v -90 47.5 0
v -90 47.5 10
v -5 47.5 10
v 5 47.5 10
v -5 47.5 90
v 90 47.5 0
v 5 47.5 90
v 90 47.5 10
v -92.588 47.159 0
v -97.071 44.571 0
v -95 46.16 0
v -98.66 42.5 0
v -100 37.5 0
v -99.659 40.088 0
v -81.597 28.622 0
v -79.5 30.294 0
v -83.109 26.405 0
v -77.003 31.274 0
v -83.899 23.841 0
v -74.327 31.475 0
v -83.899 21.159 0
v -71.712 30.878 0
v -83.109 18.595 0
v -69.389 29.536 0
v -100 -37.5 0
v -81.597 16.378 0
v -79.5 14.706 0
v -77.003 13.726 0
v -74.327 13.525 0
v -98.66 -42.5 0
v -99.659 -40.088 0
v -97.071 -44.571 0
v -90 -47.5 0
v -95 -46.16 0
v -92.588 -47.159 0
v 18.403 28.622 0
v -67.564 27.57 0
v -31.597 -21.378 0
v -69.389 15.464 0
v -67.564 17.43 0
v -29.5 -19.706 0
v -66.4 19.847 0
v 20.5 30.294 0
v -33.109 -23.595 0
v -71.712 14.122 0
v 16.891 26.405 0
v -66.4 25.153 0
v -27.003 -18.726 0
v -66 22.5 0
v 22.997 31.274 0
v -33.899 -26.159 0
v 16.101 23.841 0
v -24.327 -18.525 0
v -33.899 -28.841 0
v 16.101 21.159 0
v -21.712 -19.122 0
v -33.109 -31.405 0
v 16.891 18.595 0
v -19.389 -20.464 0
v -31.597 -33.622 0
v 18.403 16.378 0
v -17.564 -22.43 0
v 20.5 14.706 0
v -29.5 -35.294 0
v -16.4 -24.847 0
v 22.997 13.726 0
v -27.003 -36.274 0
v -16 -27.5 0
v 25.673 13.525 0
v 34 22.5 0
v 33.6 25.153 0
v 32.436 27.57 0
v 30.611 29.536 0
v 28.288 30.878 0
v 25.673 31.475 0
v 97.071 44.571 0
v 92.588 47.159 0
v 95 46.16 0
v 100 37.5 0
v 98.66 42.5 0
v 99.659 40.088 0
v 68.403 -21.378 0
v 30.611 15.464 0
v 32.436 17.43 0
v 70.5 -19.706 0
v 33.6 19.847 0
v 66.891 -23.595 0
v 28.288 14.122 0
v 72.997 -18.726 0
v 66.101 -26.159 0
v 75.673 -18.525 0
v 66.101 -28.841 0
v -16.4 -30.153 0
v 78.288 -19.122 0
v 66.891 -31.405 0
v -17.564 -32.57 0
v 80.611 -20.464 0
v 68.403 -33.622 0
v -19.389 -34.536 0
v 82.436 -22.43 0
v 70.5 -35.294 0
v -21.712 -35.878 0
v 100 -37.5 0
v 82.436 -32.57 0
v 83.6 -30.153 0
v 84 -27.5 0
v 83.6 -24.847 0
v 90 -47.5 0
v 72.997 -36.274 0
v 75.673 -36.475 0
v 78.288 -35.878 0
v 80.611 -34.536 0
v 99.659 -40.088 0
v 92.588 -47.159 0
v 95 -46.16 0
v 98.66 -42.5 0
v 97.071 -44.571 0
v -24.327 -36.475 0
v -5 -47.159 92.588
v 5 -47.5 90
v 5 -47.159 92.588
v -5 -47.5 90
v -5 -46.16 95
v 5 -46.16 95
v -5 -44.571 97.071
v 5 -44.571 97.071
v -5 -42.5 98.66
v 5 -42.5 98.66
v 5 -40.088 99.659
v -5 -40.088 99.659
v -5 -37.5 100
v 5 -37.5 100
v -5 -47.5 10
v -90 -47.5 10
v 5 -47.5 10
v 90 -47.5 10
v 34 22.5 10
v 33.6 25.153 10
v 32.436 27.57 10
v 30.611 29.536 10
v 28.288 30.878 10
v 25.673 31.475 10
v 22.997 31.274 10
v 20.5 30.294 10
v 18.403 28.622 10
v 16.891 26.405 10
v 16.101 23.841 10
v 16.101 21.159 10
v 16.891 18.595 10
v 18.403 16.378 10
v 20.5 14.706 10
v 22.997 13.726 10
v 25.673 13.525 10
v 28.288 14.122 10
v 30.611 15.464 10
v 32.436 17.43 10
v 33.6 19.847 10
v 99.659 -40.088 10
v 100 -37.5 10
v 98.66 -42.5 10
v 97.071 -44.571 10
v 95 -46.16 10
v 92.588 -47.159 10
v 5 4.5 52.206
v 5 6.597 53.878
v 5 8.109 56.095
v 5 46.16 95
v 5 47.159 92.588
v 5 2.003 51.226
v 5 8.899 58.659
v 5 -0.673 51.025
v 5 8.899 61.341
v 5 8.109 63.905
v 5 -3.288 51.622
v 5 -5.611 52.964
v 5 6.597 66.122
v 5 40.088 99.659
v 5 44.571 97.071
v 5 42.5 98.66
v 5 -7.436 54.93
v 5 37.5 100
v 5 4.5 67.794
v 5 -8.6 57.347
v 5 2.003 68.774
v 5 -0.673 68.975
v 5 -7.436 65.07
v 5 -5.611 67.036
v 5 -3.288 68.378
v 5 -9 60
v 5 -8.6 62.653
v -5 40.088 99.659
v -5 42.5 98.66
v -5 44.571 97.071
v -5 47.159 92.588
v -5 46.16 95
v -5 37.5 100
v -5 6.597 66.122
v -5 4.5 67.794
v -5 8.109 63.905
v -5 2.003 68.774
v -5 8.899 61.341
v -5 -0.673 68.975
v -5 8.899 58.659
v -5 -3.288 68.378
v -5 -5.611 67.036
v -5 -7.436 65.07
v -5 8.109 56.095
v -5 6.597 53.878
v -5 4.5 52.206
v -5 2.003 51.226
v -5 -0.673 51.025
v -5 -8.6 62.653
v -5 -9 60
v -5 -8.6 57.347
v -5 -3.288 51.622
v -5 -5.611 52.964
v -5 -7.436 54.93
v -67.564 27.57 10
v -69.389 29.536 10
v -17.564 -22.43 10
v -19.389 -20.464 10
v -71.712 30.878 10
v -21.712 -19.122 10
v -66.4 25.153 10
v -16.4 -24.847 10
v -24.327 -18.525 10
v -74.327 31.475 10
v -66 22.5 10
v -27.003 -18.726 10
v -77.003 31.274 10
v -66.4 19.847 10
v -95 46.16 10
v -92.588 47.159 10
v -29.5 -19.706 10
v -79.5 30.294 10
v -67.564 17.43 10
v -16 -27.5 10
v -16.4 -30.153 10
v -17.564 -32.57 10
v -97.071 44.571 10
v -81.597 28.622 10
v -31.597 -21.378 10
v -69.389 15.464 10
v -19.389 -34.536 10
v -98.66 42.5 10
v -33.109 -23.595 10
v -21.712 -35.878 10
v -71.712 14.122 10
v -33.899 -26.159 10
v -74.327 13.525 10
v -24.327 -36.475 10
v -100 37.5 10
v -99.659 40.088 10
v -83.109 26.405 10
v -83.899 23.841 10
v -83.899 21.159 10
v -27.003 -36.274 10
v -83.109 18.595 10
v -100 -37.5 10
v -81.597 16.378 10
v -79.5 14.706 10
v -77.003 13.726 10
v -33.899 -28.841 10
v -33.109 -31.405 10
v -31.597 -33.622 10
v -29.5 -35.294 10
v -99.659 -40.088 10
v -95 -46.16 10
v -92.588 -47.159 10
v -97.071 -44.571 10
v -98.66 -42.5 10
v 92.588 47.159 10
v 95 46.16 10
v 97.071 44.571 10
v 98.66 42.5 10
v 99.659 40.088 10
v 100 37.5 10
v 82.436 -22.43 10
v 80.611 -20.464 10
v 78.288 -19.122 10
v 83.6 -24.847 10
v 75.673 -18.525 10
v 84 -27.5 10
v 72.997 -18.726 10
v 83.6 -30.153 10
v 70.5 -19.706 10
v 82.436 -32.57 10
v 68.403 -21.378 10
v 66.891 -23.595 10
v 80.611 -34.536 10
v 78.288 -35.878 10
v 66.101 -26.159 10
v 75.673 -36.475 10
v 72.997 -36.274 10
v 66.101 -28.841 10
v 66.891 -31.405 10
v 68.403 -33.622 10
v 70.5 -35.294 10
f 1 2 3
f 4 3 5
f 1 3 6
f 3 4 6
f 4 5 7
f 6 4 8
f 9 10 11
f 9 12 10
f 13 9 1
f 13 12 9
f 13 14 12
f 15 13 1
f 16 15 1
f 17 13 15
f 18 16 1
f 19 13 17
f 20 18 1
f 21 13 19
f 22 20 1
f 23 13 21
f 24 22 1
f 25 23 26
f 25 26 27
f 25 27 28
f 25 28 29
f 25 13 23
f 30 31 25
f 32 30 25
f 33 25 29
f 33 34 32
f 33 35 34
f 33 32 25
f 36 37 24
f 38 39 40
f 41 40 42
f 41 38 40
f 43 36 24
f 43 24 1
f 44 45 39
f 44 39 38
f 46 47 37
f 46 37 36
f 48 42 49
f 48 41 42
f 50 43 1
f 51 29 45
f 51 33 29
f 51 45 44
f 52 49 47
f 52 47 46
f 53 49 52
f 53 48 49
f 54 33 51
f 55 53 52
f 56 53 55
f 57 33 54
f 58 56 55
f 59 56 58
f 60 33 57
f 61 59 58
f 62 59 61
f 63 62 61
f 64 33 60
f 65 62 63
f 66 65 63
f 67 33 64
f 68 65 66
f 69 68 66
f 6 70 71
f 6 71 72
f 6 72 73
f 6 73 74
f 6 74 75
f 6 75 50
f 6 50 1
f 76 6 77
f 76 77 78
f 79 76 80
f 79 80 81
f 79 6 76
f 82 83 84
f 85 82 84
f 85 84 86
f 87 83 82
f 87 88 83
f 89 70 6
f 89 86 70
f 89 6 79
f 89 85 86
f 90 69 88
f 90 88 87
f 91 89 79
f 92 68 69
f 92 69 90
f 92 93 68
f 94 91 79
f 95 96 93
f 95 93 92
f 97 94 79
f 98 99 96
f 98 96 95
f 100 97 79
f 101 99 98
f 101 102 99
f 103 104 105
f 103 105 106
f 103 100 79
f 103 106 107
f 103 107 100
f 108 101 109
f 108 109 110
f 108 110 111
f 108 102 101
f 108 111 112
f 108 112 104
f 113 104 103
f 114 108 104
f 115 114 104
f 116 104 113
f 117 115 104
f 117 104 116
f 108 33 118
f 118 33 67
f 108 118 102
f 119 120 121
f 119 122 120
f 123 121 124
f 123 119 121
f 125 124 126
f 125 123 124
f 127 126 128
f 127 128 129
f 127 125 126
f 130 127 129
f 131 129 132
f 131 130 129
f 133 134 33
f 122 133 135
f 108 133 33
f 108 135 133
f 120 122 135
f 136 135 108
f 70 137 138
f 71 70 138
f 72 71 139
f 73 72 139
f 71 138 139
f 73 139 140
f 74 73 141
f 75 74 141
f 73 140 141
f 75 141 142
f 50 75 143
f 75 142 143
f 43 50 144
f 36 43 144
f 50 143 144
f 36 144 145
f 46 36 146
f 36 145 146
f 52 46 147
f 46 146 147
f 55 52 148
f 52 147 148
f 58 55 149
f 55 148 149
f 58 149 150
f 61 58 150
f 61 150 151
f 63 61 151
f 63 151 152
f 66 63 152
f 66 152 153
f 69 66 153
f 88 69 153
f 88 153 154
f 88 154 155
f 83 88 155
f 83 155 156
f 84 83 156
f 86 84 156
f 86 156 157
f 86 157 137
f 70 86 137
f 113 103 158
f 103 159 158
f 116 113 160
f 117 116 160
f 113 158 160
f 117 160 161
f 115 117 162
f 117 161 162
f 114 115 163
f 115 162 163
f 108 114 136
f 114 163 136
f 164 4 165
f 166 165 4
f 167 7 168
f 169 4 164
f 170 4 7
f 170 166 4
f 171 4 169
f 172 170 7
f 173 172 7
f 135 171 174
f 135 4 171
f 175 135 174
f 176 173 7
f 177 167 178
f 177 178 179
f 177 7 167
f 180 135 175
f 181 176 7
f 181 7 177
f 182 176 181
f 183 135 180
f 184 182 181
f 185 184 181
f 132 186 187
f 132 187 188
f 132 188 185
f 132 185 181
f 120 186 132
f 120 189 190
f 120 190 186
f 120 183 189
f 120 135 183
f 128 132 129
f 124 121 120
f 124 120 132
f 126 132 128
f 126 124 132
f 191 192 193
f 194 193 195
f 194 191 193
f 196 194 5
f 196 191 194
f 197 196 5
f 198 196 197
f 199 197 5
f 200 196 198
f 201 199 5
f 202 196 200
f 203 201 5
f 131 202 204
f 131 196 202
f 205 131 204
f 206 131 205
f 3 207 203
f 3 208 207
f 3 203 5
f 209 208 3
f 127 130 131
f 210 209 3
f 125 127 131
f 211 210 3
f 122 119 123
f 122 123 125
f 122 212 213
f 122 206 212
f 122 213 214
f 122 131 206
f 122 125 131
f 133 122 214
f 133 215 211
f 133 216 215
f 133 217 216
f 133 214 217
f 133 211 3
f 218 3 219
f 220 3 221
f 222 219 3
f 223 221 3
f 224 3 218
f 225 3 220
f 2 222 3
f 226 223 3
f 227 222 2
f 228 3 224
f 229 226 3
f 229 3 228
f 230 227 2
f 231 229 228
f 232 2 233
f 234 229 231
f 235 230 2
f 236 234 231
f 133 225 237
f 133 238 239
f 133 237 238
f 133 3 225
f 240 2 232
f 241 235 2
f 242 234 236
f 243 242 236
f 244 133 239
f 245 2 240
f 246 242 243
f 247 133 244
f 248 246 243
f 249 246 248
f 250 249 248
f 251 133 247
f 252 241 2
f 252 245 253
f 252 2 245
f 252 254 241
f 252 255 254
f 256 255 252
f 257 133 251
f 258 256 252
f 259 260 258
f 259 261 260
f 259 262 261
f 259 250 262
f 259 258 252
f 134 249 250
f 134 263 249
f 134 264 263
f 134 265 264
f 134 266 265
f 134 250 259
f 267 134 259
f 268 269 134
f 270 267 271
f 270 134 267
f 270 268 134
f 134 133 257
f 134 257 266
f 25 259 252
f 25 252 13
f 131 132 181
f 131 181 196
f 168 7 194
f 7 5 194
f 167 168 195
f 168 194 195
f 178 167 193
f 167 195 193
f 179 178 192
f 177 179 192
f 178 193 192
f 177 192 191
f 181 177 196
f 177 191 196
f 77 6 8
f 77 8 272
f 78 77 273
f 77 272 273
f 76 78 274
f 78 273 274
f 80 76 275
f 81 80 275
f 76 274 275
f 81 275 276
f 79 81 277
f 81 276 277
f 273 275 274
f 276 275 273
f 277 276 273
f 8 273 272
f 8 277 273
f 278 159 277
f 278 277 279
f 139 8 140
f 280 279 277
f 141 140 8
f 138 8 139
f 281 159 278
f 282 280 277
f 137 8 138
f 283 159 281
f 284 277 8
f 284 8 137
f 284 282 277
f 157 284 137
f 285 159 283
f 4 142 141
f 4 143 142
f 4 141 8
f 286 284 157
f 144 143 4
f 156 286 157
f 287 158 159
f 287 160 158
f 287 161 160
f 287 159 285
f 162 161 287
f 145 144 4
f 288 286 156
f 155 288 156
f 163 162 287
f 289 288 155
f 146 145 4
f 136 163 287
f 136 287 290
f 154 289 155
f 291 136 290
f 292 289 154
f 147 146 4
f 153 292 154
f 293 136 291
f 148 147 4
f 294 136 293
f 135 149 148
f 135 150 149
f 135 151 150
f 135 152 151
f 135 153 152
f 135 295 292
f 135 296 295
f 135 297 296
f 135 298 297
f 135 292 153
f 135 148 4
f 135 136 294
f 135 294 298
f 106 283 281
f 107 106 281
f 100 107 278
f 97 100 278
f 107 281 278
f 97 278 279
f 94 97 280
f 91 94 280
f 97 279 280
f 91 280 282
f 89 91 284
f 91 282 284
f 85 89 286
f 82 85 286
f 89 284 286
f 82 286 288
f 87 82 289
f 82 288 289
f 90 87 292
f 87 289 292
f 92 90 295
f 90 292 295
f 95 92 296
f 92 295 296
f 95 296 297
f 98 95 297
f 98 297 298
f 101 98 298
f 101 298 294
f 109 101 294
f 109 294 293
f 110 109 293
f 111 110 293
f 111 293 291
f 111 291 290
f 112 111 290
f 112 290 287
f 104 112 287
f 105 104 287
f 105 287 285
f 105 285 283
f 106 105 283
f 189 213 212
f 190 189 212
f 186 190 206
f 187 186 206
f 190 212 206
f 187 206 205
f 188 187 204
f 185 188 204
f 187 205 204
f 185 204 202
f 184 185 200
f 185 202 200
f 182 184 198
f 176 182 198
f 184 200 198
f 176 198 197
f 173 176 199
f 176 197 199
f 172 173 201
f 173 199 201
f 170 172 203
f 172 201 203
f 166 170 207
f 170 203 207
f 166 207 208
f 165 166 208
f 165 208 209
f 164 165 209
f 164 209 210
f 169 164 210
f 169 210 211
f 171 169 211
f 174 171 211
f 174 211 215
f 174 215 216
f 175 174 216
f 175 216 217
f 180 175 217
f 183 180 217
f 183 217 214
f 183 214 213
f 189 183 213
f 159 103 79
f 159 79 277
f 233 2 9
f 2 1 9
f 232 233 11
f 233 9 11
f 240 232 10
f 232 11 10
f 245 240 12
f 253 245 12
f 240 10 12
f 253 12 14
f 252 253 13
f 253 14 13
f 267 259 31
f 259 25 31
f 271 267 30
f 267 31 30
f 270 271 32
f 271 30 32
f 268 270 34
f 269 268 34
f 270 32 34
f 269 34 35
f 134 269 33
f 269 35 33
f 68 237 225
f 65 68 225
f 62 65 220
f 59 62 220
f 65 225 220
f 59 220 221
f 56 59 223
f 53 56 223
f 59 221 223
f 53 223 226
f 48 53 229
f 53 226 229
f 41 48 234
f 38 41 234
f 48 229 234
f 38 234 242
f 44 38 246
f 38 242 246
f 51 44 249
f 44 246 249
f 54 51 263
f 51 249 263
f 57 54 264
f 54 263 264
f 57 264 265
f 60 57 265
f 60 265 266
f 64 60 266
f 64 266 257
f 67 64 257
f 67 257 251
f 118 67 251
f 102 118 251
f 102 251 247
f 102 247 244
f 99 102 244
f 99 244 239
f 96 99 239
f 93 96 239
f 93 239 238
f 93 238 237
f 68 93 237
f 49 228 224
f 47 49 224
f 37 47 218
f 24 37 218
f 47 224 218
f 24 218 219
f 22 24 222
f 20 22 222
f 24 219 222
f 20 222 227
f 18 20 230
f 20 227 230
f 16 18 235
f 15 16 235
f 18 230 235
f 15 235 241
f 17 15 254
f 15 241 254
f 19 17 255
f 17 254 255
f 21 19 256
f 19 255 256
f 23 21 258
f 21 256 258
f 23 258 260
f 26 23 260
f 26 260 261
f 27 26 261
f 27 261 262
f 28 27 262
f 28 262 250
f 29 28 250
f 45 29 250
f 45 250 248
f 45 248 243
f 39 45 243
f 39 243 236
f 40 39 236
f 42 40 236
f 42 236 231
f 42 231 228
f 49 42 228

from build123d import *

# Parameters (mm, degrees)
F1_DEPTH = 47.5
F2_R     = 9
F3_DEPTH = 25
F4_R     = 9
F5_DEPTH = 25
F6_R     = 10


with BuildPart() as f1:
    # F0 (on Front) → F1 (new body, symmetric)
    with BuildSketch(Plane.XZ):
        Polygon((-100, 0), (0, 0), (100, 0), (100, 10), (5, 10), (5, 100), (0, 100), (-5, 100), (-5, 10), (-100, 10), align=None)
    extrude(amount=F1_DEPTH, both=True)

    # F2 (on face) → F3 (cut)
    with BuildSketch(Plane.XY.offset(10)):
        with Locations((75, -27.5)):
            Circle(F2_R)
        with Locations((25, 22.5)):
            Circle(F2_R)
        with Locations((-25, -27.5)):
            Circle(F2_R)
        with Locations((-75, 22.5)):
            Circle(F2_R)
    extrude(amount=-F3_DEPTH, mode=Mode.SUBTRACT)

    # F4 (on face) → F5 (cut)
    with BuildSketch(Plane(origin=(-5, 0, 0), x_dir=(0, -1, 0), z_dir=(-1, 0, 0))):
        with Locations((0, 60)):
            Circle(F4_R)
    extrude(amount=-F5_DEPTH, mode=Mode.SUBTRACT)

    # F6
    f6_edges = [f1.edges().sort_by_distance(p)[0] for p in [
        (0, -47.5, 100),
        (0, 47.5, 100),
        (-100, 47.5, 5),
        (-100, -47.5, 5),
        (100, 47.5, 5),
        (100, -47.5, 5),
    ]]
    fillet(f6_edges, radius=F6_R)


solid = f1.part
